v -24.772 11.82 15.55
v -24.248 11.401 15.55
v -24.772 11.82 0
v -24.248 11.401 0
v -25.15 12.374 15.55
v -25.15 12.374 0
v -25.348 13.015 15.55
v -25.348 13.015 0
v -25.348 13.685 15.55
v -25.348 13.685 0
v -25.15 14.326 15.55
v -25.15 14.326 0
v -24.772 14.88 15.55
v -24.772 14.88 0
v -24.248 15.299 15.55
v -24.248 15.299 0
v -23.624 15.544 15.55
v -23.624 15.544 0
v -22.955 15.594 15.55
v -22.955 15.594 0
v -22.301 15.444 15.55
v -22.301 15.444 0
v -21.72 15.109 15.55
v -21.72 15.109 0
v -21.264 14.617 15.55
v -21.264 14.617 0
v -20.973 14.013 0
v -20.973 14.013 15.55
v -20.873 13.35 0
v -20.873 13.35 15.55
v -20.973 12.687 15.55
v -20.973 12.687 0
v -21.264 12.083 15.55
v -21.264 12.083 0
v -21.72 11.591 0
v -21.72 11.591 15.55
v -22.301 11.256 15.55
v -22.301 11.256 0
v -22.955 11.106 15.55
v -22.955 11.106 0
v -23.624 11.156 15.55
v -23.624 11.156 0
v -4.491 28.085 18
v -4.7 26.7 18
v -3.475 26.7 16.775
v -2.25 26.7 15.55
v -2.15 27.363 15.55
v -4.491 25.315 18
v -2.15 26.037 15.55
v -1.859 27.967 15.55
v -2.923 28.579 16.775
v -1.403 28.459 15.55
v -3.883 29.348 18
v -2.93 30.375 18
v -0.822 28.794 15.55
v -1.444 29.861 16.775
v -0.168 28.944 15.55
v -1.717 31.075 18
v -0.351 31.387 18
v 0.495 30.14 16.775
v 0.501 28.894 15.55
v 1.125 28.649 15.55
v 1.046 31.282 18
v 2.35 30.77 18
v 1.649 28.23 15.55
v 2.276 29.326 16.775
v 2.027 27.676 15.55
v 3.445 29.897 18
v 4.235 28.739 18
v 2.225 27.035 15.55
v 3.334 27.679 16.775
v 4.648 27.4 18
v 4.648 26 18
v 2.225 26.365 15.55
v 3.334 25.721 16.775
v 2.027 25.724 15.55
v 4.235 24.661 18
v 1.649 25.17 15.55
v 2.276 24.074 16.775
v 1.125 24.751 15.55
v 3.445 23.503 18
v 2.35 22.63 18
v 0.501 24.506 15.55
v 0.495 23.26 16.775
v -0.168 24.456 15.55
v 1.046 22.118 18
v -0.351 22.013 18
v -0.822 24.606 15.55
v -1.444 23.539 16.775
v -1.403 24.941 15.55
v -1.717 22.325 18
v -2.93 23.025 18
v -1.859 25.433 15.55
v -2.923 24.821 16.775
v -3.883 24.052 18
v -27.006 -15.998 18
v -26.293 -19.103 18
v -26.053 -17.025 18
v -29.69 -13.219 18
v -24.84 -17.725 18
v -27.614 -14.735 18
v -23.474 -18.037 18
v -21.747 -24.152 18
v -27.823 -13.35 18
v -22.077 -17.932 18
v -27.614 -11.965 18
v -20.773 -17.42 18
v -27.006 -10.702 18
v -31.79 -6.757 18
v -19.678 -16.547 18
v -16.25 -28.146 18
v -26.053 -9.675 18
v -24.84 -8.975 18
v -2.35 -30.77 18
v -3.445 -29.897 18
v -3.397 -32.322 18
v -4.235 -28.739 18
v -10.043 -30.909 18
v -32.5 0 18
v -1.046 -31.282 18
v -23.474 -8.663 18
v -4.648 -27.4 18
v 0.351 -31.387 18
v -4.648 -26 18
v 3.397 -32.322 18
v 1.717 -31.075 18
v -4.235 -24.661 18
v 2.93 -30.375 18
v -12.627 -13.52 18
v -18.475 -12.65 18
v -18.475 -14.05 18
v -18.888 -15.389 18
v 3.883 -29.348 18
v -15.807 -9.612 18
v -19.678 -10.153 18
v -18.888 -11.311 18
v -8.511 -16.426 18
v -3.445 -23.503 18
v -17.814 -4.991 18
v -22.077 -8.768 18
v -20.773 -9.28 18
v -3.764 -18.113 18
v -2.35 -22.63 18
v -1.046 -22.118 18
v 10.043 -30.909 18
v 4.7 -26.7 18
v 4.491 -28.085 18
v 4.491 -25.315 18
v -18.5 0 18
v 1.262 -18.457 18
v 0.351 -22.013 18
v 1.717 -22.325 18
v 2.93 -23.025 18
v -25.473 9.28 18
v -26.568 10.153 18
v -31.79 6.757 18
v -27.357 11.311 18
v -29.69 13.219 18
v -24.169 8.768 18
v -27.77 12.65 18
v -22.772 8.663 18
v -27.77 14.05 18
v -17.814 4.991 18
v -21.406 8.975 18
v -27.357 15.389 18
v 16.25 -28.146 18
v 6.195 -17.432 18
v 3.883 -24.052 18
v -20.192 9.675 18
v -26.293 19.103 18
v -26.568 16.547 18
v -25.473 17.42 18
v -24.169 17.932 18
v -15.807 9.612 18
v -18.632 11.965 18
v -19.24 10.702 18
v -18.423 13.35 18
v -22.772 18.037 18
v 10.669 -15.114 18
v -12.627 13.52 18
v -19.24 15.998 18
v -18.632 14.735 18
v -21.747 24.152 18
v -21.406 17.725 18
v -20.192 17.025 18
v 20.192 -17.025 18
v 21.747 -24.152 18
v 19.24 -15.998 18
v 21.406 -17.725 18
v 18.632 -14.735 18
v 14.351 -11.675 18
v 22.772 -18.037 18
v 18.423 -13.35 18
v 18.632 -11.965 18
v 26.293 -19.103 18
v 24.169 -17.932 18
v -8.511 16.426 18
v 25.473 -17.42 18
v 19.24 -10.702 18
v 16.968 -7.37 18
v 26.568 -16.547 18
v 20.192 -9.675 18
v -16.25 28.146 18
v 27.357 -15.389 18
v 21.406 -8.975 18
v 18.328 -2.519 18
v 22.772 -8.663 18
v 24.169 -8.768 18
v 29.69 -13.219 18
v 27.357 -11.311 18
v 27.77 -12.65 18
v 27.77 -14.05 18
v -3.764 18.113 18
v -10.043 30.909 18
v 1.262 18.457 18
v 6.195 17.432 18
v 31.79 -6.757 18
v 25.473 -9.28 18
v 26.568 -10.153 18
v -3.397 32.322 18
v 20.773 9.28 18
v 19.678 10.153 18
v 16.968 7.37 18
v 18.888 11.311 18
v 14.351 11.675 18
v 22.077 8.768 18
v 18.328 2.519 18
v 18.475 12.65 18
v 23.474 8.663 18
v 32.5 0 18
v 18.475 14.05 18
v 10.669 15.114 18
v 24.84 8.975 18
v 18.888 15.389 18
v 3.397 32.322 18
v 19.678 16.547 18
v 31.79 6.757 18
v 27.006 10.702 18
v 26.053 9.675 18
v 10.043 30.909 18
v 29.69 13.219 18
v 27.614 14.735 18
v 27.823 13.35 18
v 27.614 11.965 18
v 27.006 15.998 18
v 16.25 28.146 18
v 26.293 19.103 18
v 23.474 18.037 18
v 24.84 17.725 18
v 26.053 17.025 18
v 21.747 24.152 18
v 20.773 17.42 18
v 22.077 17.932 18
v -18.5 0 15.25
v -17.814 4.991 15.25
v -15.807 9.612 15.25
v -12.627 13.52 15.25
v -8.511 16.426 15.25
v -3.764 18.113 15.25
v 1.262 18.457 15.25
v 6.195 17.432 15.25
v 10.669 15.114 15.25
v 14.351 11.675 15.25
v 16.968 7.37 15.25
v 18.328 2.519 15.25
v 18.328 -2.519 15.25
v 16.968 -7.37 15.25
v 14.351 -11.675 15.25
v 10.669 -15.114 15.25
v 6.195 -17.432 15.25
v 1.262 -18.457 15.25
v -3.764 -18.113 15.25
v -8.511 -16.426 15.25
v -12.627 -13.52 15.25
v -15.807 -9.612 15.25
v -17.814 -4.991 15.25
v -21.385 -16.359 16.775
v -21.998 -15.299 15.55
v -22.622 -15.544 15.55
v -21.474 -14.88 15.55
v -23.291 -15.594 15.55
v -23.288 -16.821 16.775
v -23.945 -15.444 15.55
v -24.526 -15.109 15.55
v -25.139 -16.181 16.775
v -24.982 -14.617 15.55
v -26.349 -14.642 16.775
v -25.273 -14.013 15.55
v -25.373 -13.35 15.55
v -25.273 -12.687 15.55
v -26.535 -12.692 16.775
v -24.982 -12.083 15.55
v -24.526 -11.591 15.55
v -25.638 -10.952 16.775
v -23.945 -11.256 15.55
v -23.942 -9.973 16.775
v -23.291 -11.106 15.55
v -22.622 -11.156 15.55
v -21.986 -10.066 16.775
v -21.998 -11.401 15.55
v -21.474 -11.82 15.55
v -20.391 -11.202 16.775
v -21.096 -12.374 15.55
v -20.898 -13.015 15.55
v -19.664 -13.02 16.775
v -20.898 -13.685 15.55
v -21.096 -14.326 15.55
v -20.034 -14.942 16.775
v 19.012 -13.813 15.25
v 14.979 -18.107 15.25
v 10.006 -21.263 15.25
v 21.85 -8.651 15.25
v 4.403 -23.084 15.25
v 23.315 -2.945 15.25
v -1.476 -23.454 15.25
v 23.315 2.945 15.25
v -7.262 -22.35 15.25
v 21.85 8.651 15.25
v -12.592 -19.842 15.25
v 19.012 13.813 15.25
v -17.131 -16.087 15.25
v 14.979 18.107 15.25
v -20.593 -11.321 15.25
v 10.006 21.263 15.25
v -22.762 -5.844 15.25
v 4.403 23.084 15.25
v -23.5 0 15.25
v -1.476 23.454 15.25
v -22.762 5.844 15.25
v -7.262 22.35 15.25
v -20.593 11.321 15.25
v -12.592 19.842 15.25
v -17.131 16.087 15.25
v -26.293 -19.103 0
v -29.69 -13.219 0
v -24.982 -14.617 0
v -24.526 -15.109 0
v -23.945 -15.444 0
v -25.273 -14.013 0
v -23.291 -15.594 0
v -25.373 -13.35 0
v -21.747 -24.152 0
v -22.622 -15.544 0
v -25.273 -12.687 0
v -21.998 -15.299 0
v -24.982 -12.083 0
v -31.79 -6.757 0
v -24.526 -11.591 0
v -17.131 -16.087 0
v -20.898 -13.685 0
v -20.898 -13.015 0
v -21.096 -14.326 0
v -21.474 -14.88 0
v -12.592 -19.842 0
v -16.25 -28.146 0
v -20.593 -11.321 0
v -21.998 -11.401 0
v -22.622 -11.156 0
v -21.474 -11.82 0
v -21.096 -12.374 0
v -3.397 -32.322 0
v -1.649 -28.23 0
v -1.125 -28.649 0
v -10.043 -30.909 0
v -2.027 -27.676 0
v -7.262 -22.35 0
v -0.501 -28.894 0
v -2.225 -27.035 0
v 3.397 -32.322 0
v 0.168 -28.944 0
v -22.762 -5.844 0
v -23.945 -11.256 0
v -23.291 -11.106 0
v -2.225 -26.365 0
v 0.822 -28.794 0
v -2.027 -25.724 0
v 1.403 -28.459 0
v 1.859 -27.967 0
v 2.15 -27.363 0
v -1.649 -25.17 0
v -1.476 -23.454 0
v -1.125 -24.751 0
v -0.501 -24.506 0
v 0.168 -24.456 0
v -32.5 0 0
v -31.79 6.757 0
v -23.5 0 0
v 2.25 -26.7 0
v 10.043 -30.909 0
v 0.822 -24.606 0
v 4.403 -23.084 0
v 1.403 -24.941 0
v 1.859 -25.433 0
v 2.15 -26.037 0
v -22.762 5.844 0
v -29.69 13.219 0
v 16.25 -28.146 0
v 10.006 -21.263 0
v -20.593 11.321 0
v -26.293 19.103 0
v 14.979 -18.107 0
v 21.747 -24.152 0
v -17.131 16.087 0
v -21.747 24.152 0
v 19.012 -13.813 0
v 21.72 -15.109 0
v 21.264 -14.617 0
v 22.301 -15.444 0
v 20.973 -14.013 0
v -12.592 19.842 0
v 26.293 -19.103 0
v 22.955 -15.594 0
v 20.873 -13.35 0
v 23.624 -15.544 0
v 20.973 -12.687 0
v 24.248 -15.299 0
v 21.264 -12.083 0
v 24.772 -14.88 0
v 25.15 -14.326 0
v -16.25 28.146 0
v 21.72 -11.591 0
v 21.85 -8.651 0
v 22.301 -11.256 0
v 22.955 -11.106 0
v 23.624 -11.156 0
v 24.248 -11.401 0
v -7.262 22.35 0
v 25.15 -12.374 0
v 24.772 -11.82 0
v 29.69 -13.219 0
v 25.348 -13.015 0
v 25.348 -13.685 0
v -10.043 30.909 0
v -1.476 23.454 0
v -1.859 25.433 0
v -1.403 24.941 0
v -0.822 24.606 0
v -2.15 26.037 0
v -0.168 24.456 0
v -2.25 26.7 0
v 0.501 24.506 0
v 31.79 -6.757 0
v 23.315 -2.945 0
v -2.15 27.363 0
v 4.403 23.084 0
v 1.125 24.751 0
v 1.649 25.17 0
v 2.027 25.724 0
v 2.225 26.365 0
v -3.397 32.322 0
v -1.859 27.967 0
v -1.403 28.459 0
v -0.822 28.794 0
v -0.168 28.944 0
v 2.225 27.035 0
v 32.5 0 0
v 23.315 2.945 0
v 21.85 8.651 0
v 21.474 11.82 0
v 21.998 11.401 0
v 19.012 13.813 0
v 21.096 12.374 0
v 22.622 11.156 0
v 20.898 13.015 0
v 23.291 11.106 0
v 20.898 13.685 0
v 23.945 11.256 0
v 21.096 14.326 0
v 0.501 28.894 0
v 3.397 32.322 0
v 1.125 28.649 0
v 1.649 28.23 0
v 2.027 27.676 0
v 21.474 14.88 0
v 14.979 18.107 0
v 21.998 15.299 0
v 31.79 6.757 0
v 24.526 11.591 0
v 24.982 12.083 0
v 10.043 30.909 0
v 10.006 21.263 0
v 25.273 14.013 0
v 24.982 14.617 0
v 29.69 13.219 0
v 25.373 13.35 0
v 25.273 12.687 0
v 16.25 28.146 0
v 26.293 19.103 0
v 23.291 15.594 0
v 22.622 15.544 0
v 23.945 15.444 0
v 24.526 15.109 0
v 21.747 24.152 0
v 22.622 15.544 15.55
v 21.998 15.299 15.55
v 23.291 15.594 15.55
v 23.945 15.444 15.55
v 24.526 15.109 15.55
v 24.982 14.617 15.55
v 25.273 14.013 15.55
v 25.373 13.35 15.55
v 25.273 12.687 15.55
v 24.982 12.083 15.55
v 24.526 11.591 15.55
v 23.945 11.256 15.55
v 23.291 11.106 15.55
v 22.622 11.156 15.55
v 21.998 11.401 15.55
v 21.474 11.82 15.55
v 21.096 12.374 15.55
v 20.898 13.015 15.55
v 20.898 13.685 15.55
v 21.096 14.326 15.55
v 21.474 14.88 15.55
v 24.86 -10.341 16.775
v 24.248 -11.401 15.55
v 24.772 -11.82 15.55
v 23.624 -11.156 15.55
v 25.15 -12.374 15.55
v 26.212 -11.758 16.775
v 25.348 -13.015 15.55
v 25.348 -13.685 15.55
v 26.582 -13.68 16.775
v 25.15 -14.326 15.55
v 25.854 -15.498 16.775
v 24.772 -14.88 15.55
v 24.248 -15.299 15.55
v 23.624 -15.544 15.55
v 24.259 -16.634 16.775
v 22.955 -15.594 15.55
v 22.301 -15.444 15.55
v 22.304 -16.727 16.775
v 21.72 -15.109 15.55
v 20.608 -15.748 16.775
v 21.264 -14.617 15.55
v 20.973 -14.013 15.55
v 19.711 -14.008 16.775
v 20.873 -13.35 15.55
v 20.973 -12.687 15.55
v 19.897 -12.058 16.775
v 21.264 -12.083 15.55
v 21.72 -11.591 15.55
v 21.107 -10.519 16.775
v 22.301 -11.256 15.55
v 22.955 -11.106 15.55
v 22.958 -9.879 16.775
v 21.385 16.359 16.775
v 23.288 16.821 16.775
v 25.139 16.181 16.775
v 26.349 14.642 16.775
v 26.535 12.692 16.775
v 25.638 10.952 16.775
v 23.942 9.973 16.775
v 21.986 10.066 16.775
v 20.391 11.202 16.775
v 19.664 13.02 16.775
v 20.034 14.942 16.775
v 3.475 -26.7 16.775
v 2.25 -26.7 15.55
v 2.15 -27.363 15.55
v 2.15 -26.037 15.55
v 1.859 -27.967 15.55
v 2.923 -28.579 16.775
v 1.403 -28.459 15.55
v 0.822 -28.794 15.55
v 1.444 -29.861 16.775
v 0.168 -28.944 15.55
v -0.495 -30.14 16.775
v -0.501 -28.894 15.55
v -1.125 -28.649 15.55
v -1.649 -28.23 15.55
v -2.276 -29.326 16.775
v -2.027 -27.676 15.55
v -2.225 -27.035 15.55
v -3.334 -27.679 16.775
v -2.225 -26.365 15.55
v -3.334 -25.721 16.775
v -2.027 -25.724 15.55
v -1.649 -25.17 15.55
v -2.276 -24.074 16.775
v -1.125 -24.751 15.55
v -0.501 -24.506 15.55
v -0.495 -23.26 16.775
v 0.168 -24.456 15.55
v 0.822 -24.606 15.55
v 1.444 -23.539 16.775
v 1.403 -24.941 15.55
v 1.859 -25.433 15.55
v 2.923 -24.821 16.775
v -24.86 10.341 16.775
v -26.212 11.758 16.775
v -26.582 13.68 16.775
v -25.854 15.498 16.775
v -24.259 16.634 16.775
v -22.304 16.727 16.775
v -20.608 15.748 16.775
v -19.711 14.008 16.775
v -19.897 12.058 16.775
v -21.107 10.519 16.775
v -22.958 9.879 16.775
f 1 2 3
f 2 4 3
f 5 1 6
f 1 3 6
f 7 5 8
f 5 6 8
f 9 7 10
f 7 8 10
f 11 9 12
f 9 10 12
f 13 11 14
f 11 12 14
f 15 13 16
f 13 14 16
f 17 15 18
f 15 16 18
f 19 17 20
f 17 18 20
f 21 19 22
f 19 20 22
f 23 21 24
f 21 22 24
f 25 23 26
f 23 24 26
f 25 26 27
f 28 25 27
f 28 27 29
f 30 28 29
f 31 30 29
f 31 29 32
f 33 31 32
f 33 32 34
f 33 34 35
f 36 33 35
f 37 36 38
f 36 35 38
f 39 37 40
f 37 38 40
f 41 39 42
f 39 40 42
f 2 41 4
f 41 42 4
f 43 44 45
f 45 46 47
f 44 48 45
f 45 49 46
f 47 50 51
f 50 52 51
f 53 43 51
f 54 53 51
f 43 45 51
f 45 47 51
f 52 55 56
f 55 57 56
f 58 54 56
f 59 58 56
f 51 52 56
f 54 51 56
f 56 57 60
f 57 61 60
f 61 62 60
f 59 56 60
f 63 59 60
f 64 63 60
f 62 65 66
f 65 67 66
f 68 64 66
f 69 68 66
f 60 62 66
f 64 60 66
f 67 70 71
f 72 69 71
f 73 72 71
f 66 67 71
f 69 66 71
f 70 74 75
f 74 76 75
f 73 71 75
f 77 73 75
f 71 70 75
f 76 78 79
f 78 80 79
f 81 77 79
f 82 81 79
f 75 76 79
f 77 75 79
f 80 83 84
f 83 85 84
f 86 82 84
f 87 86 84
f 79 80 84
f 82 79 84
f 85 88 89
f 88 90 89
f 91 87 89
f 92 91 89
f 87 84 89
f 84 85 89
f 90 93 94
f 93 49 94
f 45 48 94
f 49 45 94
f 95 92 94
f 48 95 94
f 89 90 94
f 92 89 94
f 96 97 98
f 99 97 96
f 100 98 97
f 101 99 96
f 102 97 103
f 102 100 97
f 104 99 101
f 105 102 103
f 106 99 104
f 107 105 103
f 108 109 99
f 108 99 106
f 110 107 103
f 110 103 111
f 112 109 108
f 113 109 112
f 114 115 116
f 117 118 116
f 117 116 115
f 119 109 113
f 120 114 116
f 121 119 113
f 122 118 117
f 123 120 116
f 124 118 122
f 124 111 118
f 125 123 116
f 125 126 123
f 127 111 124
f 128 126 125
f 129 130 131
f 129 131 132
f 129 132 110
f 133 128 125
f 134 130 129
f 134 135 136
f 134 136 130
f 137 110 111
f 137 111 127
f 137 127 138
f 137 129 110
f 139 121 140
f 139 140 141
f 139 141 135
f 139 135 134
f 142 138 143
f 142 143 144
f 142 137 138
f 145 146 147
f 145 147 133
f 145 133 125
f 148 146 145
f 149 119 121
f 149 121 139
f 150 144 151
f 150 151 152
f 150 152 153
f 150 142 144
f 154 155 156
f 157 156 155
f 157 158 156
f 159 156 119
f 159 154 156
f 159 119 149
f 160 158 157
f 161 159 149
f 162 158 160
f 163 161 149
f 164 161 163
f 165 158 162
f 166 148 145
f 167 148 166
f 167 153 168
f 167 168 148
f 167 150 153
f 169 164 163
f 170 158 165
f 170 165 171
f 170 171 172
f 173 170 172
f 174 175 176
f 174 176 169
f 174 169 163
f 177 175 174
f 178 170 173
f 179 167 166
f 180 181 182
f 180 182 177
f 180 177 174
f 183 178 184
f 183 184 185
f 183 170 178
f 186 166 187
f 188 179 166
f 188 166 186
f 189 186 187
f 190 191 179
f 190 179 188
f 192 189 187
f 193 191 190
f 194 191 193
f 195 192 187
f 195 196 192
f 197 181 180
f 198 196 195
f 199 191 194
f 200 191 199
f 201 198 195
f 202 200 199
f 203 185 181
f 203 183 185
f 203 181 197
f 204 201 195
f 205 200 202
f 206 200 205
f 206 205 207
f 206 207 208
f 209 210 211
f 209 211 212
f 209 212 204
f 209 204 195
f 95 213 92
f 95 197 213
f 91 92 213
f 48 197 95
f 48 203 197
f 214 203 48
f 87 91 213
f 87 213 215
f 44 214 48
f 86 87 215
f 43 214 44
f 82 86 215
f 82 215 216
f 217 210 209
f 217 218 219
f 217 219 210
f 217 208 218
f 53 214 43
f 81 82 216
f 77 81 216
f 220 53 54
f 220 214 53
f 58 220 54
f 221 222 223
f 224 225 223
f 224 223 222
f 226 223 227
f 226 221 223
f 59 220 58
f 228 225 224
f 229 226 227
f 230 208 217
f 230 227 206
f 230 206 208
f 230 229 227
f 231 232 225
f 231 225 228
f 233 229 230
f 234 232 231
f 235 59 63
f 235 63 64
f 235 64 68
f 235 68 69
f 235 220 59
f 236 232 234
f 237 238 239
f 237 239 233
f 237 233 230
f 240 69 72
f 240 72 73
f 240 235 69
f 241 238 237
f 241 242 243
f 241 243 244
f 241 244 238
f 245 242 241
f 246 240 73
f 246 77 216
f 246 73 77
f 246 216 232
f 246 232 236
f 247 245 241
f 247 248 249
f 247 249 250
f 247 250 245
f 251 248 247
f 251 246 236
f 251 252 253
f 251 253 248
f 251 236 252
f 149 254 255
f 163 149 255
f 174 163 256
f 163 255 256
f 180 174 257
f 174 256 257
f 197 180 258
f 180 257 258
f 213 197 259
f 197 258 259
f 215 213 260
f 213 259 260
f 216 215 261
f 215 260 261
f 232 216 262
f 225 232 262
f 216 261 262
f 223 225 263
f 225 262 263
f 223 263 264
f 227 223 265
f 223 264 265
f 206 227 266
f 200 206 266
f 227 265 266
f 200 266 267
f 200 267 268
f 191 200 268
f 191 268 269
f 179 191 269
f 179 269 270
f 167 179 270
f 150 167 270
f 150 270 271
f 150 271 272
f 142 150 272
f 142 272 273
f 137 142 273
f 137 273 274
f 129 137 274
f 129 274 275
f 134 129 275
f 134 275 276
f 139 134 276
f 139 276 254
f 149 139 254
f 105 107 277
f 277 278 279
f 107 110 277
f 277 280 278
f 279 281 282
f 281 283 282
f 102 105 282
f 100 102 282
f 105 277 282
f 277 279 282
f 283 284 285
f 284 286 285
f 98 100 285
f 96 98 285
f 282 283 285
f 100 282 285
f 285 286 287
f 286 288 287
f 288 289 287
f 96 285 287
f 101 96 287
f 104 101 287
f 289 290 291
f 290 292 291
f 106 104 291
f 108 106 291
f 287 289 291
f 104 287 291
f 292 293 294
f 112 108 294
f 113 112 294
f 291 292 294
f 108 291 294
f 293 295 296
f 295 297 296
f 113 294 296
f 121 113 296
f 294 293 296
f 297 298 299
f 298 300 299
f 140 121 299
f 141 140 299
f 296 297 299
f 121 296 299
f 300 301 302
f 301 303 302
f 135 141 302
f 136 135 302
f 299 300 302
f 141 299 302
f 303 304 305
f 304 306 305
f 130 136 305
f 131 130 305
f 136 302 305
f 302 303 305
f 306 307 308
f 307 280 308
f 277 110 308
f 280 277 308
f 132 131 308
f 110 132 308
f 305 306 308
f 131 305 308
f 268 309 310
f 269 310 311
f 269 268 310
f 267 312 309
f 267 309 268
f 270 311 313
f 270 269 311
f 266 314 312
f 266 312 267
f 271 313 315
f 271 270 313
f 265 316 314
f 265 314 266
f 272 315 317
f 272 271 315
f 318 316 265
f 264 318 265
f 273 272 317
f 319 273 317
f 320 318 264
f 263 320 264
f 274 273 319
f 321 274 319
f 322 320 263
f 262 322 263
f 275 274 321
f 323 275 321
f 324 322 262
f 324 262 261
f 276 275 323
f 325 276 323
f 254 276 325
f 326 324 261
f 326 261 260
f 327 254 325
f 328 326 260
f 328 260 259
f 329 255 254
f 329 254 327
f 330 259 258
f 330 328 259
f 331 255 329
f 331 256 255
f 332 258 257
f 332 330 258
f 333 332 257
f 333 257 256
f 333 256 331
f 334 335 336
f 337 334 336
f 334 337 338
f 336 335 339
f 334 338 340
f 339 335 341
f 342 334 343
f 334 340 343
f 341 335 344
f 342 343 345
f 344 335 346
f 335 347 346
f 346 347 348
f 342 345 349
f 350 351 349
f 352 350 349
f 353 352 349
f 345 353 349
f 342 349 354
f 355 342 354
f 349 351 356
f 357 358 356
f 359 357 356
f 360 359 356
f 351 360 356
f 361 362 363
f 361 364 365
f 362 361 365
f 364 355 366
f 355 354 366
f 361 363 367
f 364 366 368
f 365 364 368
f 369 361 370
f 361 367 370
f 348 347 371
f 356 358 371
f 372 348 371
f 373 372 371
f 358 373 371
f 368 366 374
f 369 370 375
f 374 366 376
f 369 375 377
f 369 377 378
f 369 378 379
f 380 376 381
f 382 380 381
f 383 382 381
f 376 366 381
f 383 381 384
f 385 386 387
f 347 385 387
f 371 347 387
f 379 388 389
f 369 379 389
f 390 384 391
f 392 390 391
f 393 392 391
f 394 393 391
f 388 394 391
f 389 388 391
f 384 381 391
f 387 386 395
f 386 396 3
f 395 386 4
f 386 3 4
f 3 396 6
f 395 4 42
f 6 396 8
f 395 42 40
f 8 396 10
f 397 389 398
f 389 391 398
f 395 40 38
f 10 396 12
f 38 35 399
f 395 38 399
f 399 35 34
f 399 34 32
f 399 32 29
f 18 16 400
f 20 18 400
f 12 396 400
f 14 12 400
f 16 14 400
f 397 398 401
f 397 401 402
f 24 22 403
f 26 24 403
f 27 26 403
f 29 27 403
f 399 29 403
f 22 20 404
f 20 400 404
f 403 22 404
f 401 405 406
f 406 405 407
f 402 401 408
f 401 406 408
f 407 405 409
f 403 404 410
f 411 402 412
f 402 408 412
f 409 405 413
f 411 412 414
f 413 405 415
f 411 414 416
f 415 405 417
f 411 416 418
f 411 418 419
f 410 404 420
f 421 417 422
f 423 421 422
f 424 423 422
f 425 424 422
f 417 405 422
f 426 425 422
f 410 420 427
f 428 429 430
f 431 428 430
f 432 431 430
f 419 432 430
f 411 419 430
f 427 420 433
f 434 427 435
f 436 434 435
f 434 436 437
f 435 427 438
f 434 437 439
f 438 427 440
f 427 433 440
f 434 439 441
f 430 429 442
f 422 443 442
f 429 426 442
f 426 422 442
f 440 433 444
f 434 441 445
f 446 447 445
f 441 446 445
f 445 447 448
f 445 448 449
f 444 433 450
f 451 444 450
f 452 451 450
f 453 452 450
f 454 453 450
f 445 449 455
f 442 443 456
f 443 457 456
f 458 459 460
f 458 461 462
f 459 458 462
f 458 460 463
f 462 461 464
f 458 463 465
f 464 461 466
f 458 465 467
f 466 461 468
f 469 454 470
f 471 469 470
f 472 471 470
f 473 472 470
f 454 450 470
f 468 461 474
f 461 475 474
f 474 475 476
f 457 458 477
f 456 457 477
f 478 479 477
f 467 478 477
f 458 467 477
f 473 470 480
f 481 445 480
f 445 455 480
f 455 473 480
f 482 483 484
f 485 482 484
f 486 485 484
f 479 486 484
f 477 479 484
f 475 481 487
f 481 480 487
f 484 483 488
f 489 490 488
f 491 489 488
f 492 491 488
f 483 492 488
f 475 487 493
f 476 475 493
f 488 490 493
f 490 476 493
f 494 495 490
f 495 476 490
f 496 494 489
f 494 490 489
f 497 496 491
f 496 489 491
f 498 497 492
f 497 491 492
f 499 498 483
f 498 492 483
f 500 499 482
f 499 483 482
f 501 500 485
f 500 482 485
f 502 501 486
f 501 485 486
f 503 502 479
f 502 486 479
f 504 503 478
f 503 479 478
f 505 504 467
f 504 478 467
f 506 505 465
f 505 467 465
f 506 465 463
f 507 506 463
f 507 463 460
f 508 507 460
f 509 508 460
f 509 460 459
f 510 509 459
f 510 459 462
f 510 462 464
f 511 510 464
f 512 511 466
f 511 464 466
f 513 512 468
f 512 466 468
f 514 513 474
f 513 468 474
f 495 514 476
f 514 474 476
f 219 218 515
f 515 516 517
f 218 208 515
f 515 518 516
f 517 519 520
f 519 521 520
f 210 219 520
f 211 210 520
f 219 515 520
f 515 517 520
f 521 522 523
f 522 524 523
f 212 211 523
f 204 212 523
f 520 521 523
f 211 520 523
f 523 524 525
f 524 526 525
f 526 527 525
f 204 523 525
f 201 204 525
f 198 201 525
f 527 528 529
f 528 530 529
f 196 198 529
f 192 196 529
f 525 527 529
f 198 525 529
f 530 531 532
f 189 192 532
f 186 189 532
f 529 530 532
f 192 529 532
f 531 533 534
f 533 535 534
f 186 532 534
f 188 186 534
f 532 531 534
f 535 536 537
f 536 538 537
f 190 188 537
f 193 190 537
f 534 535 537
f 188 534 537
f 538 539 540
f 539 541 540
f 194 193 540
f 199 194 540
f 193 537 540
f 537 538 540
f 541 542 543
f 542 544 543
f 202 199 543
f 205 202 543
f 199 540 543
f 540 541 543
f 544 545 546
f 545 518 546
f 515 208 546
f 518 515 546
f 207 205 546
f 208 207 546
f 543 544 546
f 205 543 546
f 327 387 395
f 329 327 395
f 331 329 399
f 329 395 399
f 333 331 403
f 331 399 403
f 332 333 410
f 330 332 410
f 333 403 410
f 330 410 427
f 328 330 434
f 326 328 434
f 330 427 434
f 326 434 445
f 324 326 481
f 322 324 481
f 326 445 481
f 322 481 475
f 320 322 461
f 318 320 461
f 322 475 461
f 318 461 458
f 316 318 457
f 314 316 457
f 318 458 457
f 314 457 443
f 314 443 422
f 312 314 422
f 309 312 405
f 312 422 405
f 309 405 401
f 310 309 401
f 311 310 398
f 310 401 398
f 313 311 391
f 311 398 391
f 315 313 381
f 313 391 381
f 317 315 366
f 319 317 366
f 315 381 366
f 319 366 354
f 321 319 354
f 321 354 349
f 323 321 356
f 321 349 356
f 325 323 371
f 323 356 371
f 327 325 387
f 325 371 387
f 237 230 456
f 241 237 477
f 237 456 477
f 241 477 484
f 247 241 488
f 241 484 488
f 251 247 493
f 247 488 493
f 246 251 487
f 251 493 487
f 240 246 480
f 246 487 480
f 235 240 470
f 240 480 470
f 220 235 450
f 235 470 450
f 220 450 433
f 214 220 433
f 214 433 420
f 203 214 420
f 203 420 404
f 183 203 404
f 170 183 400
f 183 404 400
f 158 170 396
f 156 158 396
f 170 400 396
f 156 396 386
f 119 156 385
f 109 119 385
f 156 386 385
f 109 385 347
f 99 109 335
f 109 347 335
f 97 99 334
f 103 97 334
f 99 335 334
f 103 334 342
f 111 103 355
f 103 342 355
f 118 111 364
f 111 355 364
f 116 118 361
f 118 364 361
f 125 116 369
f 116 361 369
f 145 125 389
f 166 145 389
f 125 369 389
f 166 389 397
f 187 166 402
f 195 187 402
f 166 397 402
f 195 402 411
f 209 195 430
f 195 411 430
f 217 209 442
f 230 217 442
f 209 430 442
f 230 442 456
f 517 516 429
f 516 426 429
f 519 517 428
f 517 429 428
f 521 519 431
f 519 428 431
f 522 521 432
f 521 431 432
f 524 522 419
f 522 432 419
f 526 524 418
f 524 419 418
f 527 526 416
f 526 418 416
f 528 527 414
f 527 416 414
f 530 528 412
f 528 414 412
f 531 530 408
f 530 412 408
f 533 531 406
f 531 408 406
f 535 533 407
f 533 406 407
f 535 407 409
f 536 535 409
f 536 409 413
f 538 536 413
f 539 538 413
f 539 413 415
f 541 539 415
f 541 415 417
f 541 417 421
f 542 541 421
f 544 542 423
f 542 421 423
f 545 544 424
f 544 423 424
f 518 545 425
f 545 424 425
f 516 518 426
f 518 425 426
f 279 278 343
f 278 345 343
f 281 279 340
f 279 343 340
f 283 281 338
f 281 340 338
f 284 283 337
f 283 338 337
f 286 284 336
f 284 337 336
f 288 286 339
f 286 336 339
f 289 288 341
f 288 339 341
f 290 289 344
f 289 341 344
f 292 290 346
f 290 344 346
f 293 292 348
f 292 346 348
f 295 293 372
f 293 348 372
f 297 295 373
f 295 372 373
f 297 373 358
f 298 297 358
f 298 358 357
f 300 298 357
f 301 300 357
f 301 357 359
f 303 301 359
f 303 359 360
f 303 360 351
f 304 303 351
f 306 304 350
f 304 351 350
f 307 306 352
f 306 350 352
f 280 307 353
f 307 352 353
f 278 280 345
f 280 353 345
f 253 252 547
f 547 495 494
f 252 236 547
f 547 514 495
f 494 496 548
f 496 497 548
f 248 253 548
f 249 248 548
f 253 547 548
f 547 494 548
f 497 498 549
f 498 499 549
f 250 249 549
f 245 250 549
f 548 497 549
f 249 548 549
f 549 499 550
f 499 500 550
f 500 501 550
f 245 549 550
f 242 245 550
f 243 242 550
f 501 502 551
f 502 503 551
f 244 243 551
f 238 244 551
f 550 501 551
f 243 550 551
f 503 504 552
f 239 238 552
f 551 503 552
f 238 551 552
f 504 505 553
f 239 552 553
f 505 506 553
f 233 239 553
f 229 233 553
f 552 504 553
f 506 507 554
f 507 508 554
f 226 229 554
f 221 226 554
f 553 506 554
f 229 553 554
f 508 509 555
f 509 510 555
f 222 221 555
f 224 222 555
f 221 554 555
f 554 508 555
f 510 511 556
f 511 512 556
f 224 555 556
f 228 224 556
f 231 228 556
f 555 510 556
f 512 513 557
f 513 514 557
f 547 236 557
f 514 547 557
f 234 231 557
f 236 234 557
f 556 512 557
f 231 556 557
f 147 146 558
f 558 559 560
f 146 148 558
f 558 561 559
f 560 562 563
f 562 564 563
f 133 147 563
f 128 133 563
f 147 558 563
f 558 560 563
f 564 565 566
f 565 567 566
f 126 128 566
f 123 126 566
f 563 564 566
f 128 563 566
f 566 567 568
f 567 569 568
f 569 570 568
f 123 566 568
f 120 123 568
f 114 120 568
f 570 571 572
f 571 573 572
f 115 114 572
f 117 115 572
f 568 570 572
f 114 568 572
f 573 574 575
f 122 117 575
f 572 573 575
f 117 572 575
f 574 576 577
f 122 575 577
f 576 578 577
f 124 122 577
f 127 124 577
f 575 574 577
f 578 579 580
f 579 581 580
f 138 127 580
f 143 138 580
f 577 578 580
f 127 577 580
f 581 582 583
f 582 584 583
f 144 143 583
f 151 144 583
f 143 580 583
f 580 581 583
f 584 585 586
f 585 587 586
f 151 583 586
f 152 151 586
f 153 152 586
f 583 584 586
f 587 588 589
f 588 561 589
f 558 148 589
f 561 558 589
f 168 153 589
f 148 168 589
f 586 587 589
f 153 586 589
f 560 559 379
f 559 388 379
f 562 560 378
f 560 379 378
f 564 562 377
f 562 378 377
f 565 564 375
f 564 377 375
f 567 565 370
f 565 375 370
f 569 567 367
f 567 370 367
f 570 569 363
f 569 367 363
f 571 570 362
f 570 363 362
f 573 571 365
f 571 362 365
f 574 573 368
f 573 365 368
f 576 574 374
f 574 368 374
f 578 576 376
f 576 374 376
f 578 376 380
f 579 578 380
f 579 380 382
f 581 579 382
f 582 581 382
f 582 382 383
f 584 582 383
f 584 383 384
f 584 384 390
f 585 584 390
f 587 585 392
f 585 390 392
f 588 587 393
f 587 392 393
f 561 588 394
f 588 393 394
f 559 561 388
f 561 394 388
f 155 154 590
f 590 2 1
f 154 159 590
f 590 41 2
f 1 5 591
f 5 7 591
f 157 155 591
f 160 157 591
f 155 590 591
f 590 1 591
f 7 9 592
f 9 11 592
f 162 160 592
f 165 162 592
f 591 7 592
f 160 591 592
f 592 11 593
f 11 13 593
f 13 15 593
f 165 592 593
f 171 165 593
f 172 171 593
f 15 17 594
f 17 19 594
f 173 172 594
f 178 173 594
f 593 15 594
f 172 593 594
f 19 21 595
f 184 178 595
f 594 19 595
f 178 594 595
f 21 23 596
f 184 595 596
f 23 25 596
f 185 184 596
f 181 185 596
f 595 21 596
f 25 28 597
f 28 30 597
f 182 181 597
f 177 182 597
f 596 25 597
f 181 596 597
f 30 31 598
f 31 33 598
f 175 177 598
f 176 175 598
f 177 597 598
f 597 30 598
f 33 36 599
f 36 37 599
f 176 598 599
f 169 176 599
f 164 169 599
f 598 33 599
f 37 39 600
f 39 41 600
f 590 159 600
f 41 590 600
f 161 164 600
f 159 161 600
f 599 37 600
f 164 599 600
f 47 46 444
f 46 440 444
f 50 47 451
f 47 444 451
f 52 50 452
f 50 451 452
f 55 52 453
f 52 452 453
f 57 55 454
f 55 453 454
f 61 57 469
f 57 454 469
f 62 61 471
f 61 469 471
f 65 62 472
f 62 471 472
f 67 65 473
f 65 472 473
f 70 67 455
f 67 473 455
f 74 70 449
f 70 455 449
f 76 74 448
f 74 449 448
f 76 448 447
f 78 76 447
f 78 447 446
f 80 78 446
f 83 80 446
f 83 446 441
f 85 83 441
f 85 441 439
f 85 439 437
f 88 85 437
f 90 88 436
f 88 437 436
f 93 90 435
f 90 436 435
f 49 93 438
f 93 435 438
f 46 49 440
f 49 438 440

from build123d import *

# Parameters (mm, degrees)
SKETCH1_R                                       = 32.5
BOSS_EXTRUDE1_DEPTH                             = 18
CSK_FOR_M4_FLAT_HEAD_MACHINE_SCREW1_D           = 4.5
CSK_FOR_M4_FLAT_HEAD_MACHINE_SCREW1_CSINK_D     = 9.4
CSK_FOR_M4_FLAT_HEAD_MACHINE_SCREW1_CSINK_ANGLE = 90
CIRPATTERN1_COUNT                               = 6
SKETCH4_R                                       = 18.5
CUT_EXTRUDE1_DEPTH                              = 30
SKETCH5_R                                       = 23.5
CUT_EXTRUDE2_DEPTH                              = 15.25


with BuildPart() as part:
    # Sketch1 → Boss-Extrude1 (new body)
    with BuildSketch(Plane.XY):
        Circle(SKETCH1_R)
    extrude(amount=BOSS_EXTRUDE1_DEPTH)

    # CSK for M4 Flat Head Machine Screw1 (through all)
    with Locations(Plane.XY.offset(18)):
        with Locations((0, 26.7)):
            csk_for_m4_flat_head_machine_screw1 = CounterSinkHole(CSK_FOR_M4_FLAT_HEAD_MACHINE_SCREW1_D / 2, CSK_FOR_M4_FLAT_HEAD_MACHINE_SCREW1_CSINK_D / 2, counter_sink_angle=CSK_FOR_M4_FLAT_HEAD_MACHINE_SCREW1_CSINK_ANGLE)

    # CirPattern1: CSK for M4 Flat Head Machine Screw1 ×6 about axis
    cirpattern1_axis = Axis((0, 0, 0), (0, 0, 1))
    for i in range(1, CIRPATTERN1_COUNT):
        add(csk_for_m4_flat_head_machine_screw1.rotate(cirpattern1_axis, i * 360 / CIRPATTERN1_COUNT), mode=Mode.SUBTRACT)

    # Sketch4 → Cut-Extrude1 (cut)
    with BuildSketch(Plane(origin=(0, 0, 0), x_dir=(-1, 0, 0), z_dir=(0, 0, -1))):
        Circle(SKETCH4_R)
    extrude(amount=-CUT_EXTRUDE1_DEPTH, mode=Mode.SUBTRACT)

    # Sketch5 → Cut-Extrude2 (cut)
    with BuildSketch(Plane(origin=(0, 0, 0), x_dir=(-1, 0, 0), z_dir=(0, 0, -1))):
        Circle(SKETCH5_R)
    extrude(amount=-CUT_EXTRUDE2_DEPTH, mode=Mode.SUBTRACT)


solid = part.part
